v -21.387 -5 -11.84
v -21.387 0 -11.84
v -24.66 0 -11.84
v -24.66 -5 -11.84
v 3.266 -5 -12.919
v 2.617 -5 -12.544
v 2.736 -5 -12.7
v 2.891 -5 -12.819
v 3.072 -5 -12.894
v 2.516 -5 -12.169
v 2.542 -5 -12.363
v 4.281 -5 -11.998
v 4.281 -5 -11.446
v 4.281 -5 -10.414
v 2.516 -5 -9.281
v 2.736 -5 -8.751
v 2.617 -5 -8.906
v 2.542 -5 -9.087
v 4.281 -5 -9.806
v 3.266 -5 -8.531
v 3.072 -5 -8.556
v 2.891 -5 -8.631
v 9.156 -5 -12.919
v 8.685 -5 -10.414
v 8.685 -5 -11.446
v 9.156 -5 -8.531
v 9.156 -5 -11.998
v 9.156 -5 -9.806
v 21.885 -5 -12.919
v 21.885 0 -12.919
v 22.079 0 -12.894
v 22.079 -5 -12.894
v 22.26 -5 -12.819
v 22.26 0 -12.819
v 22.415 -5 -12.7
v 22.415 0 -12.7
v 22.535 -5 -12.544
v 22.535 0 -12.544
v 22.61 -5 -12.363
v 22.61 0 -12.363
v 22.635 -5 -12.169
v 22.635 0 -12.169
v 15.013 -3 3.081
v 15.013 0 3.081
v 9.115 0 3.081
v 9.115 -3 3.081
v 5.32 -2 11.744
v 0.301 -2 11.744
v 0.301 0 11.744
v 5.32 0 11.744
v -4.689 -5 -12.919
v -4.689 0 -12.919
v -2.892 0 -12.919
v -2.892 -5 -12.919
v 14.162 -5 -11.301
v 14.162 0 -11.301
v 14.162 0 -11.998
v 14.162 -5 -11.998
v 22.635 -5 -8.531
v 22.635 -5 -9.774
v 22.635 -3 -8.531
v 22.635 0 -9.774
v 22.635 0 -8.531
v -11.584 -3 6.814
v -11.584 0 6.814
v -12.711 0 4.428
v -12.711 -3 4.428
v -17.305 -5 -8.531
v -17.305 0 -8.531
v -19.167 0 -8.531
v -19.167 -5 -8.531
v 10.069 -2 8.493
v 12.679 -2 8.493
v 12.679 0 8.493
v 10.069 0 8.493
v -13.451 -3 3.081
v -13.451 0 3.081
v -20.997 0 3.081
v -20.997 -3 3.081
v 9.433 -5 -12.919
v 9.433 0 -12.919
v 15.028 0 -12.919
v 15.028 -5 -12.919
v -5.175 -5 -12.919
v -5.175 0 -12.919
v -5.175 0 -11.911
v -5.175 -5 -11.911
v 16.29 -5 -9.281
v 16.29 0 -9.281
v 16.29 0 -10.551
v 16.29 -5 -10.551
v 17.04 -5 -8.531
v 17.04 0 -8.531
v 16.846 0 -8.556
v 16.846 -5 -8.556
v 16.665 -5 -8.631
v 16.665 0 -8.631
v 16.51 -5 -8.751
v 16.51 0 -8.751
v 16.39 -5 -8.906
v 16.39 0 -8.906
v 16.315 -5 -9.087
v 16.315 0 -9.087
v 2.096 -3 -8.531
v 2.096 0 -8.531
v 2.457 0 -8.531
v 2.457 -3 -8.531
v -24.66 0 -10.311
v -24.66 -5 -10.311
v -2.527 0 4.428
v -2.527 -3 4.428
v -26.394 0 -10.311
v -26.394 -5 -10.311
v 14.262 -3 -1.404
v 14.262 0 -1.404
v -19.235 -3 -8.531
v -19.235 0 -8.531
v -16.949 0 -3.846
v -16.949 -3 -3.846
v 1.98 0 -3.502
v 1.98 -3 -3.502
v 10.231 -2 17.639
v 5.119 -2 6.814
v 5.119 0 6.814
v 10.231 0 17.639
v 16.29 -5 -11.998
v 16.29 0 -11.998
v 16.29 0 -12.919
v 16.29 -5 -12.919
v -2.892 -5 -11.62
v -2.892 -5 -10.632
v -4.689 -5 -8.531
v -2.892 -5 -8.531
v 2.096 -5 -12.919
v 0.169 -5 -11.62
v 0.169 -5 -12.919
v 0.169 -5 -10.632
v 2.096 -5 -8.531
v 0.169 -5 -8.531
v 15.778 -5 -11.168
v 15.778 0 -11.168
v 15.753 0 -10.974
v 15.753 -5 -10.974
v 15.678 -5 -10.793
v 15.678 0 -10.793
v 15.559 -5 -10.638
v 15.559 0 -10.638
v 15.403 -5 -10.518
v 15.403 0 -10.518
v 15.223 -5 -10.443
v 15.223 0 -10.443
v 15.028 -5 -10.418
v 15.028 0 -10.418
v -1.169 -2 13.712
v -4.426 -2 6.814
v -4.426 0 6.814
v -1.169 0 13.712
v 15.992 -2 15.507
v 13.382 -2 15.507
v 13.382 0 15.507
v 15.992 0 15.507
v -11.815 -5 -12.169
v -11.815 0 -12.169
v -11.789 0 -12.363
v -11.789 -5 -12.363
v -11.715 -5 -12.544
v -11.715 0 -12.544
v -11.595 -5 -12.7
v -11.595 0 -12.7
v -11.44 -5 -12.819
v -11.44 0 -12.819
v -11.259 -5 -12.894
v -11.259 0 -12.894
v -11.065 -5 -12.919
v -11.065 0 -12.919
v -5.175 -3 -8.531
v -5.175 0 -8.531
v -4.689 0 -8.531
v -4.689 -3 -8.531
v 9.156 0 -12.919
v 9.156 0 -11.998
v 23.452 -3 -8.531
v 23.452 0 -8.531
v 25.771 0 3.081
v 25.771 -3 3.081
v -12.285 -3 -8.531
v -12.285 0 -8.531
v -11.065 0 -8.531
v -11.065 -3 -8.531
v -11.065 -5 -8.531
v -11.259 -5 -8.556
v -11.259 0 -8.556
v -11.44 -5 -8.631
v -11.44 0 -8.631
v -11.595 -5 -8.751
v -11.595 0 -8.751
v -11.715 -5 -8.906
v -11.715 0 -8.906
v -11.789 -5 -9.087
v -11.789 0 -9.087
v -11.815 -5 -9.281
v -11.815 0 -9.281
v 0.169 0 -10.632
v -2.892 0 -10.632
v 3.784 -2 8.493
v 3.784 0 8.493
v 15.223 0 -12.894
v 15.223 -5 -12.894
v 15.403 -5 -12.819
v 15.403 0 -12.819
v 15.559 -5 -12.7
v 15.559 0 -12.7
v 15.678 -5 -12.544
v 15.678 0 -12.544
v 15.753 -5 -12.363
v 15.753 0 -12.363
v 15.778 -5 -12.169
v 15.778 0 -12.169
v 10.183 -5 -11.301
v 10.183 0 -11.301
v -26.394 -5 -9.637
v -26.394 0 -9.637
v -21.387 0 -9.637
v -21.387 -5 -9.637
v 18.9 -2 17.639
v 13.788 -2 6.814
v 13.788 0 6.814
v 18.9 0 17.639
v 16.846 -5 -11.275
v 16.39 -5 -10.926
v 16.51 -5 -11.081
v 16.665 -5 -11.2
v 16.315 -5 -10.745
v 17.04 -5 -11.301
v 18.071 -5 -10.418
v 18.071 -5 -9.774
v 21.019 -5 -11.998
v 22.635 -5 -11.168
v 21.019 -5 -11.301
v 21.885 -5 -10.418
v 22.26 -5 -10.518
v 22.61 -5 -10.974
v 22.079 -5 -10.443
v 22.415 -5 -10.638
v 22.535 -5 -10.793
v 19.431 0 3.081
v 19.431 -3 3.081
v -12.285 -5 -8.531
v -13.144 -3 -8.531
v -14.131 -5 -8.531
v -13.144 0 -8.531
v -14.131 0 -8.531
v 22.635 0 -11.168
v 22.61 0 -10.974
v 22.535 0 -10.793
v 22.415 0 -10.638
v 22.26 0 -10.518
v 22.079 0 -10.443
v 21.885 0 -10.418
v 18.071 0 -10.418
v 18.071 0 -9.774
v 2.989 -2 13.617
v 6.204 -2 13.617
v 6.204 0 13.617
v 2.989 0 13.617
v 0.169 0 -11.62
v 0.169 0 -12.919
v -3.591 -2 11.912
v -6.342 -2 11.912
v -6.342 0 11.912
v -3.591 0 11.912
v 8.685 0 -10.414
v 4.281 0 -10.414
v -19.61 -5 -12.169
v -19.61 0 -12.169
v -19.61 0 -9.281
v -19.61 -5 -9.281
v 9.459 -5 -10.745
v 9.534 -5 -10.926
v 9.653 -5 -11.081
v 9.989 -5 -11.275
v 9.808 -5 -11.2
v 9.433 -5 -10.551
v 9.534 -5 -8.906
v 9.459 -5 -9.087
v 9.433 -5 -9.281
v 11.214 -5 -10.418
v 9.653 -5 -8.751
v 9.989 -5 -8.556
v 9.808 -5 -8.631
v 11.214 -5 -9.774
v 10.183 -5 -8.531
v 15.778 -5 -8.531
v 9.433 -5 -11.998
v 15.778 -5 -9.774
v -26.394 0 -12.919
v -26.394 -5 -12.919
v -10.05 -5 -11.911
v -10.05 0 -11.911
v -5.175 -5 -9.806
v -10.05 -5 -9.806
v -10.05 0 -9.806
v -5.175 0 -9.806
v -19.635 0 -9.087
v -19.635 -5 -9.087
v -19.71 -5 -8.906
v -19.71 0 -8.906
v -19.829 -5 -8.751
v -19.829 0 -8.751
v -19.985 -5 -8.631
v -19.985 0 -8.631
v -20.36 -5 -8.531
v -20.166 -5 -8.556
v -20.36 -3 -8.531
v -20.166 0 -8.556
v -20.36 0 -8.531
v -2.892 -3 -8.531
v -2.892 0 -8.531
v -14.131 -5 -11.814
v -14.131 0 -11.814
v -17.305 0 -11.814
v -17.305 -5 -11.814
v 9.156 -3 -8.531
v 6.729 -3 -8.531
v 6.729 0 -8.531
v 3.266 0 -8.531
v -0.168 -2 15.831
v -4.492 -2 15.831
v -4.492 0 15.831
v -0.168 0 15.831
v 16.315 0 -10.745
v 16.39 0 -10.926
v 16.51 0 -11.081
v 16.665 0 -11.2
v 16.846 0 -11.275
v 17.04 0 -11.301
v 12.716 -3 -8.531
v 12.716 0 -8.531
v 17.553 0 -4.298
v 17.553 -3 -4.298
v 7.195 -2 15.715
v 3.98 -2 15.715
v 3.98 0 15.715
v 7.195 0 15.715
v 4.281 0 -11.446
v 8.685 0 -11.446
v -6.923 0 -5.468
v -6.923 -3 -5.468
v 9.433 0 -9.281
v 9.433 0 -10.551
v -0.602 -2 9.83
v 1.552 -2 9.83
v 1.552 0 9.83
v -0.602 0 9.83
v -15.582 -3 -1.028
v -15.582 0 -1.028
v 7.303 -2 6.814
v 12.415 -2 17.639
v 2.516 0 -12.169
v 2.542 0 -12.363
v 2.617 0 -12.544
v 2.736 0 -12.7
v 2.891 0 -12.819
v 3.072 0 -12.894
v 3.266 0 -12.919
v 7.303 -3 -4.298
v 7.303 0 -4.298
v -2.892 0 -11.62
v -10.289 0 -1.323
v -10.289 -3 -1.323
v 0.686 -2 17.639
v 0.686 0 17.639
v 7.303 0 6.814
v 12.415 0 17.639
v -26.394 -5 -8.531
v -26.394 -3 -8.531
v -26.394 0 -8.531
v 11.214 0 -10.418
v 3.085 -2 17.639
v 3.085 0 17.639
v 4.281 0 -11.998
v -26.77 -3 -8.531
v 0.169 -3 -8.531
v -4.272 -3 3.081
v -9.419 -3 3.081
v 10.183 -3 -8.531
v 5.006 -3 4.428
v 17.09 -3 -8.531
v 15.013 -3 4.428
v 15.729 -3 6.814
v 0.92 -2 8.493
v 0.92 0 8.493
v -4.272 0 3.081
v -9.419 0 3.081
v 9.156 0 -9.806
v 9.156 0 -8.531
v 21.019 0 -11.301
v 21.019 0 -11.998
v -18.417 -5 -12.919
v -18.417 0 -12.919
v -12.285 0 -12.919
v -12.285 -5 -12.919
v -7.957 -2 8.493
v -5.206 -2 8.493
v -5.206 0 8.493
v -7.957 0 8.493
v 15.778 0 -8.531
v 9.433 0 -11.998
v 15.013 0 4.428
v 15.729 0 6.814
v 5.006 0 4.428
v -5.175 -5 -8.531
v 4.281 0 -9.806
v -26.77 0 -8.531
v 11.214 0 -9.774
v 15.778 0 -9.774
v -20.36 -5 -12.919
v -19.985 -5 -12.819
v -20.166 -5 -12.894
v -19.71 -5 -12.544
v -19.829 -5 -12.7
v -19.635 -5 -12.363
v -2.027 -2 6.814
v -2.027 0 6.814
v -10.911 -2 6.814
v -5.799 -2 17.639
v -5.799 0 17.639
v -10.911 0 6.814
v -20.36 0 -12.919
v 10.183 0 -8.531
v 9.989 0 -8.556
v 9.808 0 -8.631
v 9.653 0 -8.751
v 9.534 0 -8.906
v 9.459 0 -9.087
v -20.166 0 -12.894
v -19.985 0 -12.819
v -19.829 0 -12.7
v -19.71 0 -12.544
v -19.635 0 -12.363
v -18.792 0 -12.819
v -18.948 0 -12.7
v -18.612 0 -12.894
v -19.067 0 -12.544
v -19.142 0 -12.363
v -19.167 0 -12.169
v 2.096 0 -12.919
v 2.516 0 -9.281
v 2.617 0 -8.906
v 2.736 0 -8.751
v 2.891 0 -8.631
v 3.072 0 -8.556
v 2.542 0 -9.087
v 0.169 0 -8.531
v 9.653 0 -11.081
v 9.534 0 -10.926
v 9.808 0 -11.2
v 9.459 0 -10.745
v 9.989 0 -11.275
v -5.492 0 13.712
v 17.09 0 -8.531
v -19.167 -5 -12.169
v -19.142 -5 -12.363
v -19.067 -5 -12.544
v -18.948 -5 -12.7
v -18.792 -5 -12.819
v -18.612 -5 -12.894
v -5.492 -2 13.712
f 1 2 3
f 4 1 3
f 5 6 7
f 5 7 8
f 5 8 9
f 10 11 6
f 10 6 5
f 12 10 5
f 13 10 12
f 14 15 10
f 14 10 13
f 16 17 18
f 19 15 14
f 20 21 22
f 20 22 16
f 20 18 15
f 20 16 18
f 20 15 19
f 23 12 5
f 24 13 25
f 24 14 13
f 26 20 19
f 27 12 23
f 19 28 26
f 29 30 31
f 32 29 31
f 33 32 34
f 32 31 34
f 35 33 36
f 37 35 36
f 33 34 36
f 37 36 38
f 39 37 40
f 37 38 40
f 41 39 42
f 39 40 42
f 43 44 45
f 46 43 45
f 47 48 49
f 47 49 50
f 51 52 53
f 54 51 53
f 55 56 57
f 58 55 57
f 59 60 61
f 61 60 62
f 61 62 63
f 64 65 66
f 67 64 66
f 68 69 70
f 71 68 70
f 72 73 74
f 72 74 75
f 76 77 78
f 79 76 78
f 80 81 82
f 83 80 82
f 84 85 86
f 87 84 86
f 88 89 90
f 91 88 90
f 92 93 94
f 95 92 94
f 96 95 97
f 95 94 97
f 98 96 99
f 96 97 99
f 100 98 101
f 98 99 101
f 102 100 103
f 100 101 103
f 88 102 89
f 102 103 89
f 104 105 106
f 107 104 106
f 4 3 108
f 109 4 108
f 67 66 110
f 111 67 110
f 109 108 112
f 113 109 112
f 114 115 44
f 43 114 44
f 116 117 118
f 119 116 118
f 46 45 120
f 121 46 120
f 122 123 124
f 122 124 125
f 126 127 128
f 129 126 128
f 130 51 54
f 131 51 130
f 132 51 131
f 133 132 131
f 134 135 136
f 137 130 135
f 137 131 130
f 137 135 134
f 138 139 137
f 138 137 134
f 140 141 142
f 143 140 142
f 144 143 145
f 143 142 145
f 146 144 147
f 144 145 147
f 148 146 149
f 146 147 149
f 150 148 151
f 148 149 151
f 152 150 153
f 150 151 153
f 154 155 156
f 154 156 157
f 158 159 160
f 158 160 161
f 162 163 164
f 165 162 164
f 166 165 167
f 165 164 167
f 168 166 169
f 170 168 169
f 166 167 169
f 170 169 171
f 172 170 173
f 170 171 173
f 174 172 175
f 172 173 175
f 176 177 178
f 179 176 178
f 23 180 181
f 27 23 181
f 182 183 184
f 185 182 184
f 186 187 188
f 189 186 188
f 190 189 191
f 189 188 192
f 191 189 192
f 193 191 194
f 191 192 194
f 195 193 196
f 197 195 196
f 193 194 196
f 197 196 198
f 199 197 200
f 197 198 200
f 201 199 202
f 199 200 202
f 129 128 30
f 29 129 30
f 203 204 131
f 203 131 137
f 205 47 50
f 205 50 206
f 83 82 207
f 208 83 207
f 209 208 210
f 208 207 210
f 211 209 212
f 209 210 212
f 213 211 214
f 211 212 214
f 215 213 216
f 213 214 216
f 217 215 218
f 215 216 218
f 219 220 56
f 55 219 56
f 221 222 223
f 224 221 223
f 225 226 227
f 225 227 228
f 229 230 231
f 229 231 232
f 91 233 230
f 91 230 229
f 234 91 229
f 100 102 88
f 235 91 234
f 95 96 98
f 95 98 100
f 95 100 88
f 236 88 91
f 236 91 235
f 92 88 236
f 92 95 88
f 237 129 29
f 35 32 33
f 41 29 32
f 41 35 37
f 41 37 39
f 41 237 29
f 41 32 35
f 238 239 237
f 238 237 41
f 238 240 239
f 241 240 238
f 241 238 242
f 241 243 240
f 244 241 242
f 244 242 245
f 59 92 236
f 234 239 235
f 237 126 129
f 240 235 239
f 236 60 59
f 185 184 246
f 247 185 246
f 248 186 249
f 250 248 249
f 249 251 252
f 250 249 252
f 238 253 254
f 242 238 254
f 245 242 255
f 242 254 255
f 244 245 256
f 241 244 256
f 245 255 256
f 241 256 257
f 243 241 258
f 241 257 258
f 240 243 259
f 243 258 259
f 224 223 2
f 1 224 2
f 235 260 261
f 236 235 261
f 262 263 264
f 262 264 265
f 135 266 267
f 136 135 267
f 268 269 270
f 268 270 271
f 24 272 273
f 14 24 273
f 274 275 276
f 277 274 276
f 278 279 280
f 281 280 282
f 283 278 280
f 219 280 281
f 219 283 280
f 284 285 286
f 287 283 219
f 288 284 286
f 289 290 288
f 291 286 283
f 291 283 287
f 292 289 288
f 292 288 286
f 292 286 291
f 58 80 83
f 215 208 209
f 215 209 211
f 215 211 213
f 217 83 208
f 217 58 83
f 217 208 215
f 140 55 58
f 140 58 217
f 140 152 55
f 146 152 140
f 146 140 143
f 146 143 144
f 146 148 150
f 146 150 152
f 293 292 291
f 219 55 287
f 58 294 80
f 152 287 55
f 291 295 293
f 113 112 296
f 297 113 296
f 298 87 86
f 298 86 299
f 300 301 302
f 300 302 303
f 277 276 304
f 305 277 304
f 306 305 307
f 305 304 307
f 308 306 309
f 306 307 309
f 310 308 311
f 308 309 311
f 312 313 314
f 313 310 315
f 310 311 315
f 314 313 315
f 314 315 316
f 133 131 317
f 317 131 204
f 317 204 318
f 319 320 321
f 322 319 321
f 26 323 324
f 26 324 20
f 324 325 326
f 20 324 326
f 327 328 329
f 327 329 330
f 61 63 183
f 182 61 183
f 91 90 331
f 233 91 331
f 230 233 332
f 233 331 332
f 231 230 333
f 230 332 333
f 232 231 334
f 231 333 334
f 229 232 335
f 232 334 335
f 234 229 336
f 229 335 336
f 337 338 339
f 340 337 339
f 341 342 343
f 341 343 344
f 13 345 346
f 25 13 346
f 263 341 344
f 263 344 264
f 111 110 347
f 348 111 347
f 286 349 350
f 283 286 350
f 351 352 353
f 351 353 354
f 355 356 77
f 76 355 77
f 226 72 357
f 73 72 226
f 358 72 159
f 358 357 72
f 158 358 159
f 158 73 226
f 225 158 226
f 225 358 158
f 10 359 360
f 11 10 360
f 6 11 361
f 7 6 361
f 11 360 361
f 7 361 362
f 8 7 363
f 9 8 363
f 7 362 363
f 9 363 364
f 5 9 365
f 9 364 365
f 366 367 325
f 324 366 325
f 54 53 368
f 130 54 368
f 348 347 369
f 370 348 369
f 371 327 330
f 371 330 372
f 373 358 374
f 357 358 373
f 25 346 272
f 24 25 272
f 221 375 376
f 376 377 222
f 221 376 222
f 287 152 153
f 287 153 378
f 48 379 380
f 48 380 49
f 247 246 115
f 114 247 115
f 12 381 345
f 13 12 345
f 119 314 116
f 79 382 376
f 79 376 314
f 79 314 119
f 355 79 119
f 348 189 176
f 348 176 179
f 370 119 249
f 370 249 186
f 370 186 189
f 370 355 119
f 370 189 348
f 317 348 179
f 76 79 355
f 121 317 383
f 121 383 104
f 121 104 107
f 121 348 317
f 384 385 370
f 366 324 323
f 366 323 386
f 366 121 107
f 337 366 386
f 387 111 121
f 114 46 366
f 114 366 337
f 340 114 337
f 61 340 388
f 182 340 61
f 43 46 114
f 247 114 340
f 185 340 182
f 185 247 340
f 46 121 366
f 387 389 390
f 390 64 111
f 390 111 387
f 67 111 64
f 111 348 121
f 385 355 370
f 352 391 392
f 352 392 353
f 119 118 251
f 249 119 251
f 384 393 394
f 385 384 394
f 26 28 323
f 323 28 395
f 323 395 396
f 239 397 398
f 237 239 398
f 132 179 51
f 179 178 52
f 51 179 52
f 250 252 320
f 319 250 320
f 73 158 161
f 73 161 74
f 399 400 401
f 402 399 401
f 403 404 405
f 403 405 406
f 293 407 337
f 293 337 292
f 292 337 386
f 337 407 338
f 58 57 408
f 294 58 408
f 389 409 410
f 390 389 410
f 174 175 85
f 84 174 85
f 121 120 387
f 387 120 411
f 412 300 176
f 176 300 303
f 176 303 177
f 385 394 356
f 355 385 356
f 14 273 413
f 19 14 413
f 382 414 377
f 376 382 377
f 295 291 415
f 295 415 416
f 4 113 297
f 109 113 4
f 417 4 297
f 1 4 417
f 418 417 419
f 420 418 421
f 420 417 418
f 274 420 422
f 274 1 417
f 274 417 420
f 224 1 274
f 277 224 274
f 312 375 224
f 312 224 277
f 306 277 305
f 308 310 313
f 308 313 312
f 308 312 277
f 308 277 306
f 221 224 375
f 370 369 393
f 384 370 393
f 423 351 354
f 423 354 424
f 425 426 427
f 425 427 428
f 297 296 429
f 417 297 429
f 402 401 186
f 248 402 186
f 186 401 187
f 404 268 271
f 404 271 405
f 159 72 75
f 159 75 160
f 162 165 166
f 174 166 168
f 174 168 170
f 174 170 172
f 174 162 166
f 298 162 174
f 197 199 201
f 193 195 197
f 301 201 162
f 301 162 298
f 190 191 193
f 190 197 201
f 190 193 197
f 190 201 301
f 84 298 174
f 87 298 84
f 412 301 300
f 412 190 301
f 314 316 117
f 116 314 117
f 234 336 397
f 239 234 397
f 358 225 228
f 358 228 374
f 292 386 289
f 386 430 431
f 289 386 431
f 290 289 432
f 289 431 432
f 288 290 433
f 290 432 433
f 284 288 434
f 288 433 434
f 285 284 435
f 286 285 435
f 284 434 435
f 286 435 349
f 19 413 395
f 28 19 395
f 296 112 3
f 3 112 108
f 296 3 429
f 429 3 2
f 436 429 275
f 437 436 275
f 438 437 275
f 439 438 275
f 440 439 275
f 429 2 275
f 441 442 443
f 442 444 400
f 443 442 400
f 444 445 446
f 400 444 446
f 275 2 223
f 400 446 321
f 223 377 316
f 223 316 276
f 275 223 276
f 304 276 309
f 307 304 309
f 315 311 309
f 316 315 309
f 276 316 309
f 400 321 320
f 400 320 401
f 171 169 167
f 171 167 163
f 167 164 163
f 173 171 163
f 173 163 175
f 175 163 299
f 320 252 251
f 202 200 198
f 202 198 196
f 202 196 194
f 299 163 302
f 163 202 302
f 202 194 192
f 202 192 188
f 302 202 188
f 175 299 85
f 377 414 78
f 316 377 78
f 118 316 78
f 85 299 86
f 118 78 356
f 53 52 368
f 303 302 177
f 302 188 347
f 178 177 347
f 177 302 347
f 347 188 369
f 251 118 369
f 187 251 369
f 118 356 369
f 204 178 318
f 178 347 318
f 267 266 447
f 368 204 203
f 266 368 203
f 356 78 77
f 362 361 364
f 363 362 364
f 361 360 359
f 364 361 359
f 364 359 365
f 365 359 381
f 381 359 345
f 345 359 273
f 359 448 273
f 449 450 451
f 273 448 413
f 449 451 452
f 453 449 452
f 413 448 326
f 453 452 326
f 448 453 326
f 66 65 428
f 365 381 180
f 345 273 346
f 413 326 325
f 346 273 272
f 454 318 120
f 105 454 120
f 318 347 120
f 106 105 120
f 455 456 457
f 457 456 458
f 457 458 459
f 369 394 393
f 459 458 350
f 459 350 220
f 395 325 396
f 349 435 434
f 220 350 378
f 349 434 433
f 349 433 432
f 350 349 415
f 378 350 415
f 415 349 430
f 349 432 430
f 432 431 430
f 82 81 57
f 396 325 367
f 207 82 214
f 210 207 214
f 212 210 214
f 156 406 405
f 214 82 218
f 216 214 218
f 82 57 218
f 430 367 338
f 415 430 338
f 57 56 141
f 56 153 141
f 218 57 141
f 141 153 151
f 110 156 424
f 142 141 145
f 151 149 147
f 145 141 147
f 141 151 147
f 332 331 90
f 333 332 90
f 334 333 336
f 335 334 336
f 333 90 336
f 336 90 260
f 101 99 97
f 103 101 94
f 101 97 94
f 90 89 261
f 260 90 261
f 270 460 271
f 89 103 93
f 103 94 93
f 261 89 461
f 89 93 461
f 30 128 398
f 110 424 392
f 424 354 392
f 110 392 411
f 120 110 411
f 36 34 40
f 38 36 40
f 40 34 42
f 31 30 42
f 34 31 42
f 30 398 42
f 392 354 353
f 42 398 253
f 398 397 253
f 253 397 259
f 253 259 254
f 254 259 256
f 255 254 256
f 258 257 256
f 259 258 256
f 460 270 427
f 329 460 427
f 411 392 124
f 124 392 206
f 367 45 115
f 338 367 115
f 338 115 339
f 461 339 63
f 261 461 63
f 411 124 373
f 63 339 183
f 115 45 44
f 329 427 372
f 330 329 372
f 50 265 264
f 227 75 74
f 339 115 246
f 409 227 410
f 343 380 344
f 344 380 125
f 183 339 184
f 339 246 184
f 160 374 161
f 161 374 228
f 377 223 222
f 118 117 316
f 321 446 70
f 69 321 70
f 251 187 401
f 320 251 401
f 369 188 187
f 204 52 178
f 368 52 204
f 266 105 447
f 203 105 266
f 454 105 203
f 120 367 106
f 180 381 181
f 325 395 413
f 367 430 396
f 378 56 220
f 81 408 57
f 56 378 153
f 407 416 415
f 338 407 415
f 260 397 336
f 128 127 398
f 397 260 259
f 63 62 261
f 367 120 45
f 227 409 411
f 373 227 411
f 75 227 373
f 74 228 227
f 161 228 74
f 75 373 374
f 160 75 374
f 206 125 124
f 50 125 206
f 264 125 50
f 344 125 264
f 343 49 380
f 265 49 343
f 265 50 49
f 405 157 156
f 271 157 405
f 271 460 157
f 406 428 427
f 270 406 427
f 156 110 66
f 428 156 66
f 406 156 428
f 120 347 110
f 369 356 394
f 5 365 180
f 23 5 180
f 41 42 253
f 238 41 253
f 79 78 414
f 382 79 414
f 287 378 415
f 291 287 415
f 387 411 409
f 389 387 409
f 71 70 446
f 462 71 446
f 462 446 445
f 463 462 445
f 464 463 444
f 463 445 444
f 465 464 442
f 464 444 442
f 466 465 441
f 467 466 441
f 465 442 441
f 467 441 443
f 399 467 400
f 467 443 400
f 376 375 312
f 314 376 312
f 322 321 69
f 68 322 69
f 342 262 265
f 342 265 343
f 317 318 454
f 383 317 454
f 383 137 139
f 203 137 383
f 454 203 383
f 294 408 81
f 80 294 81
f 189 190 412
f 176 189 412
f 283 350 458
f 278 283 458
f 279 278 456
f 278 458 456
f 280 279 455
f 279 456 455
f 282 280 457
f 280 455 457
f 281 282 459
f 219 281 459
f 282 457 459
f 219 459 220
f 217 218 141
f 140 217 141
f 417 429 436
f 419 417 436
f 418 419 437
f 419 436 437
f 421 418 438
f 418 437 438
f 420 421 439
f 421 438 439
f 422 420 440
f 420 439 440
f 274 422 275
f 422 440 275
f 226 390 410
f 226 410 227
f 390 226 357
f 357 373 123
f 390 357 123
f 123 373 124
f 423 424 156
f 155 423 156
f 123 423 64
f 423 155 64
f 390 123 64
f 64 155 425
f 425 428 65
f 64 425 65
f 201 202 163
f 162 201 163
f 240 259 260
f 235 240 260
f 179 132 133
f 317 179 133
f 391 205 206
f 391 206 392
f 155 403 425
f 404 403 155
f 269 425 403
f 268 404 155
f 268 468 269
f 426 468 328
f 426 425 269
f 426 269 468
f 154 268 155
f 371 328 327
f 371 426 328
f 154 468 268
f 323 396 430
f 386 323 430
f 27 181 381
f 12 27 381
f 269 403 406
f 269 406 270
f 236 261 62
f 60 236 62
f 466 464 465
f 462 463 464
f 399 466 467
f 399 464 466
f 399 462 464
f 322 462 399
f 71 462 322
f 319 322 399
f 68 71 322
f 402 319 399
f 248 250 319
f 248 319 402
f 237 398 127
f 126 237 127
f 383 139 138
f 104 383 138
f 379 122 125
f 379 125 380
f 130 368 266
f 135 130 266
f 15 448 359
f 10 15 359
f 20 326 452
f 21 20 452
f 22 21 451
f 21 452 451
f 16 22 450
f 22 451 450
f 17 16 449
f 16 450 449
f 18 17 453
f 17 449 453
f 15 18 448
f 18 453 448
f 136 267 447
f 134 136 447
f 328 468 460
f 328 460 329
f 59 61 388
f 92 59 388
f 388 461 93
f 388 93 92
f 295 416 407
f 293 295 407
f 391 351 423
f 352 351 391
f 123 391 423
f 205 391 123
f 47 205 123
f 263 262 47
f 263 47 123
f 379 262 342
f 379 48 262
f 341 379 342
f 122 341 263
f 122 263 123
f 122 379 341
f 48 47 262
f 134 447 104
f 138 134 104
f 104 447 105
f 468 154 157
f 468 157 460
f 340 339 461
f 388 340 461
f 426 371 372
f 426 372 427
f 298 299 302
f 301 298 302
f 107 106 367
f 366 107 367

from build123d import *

# Parameters (mm, degrees)
F0_W     = 3.0607780209
F0_H     = 2.1009956449
F1_DEPTH = 5
F3_DEPTH = 2
F4_START = -3
F4_DEPTH = 2


with BuildPart() as f1:
    # F0 (on Front) → F1 (new body)
    with BuildSketch(Plane.XZ):
        with BuildLine():
            Line((-13.4510826319, 3.0807058793), (-20.9973859143, 3.0807058793))
            Line((-20.9973859143, 3.0807058793), (-26.770388545, -8.5309240967))
            Line((-26.770388545, -8.5309240967), (-26.3940021396, -8.5309240967))
            Line((-26.3940021396, -8.5309240967), (-26.3940021396, -9.6365026161))
            Line((-26.3940021396, -9.6365026161), (-21.3870331645, -9.6365026161))
            Line((-21.3870331645, -9.6365026161), (-21.3870331645, -11.8402632847))
            Line((-21.3870331645, -11.8402632847), (-24.6597826481, -11.8402632847))
            Line((-24.6597826481, -11.8402632847), (-24.6597826481, -10.3107876107))
            Line((-24.6597826481, -10.3107876107), (-26.3940021396, -10.3107876107))
            Line((-26.3940021396, -10.3107876107), (-26.3940021396, -12.9192377403))
            Line((-26.3940021396, -12.9192377403), (-20.359800871, -12.9192377403))
            ThreePointArc((-20.359800871, -12.9192377403), (-19.8294707851, -12.6995678262), (-19.609800871, -12.1692377403))
            Line((-19.609800871, -12.1692377403), (-19.609800871, -9.2809240967))
            ThreePointArc((-19.609800871, -9.2809240967), (-19.8294707851, -8.7505940108), (-20.359800871, -8.5309240967))
            Line((-20.359800871, -8.5309240967), (-19.2351932671, -8.5309240967))
            Line((-19.2351932671, -8.5309240967), (-16.9493351132, -3.8456239272))
            Line((-16.9493351132, -3.8456239272), (-13.144302211, -8.5309240967))
            Line((-13.144302211, -8.5309240967), (-14.130868949, -8.5309240967))
            Line((-14.130868949, -8.5309240967), (-14.130868949, -11.8141257167))
            Line((-14.130868949, -11.8141257167), (-17.3050090671, -11.8141257167))
            Line((-17.3050090671, -11.8141257167), (-17.3050090671, -8.5309240967))
            Line((-17.3050090671, -8.5309240967), (-19.167387858, -8.5309240967))
            Line((-19.167387858, -8.5309240967), (-19.167387858, -12.1691745073))
            ThreePointArc((-19.167387858, -12.1691745073), (-18.9477179439, -12.6995045932), (-18.417387858, -12.9191745073))
            Line((-18.417387858, -12.9191745073), (-12.2846849263, -12.9191745073))
            Line((-12.2846849263, -12.9191745073), (-12.2846849263, -8.5309240967))
            Line((-12.2846849263, -8.5309240967), (-11.065042235, -8.5309240967))
            ThreePointArc((-11.065042235, -8.5309240967), (-11.5953723208, -8.7505940108), (-11.815042235, -9.2809240967))
            Line((-11.815042235, -9.2809240967), (-11.815042235, -12.1692377403))
            ThreePointArc((-11.815042235, -12.1692377403), (-11.5953723208, -12.6995678262), (-11.065042235, -12.9192377403))
            Line((-11.065042235, -12.9192377403), (-5.1752589643, -12.9192377403))
            Line((-5.1752589643, -12.9192377403), (-5.1752589643, -11.9112924635))
            Line((-5.1752589643, -11.9112924635), (-10.0498311222, -11.9112924635))
            Line((-10.0498311222, -11.9112924635), (-10.0498311222, -9.8059958741))
            Line((-10.0498311222, -9.8059958741), (-5.1752589643, -9.8059958741))
            Line((-5.1752589643, -9.8059958741), (-5.1752589643, -8.5309240967))
            Line((-5.1752589643, -8.5309240967), (-4.6894219704, -8.5309240967))
            Line((-4.6894219704, -8.5309240967), (-4.6894219704, -12.9192377403))
            Line((-4.6894219704, -12.9192377403), (-2.891822136, -12.9192377403))
            Line((-2.891822136, -12.9192377403), (-2.891822136, -11.6197903603))
            Line((-2.891822136, -11.6197903603), (0.1689558849, -11.6197903603))
            Line((0.1689558849, -11.6197903603), (0.1689558849, -12.9192377403))
            Line((0.1689558849, -12.9192377403), (2.096112119, -12.9192377403))
            Line((2.096112119, -12.9192377403), (2.096112119, -8.5309240967))
            Line((2.096112119, -8.5309240967), (2.4571896065, -8.5309240967))
            Line((2.4571896065, -8.5309240967), (7.3034735397, -4.2975358665))
            Line((7.3034735397, -4.2975358665), (6.7291194573, -8.5309240967))
            Line((6.7291194573, -8.5309240967), (3.2661118247, -8.5309240967))
            ThreePointArc((3.2661118247, -8.5309240967), (2.7357817388, -8.7505940108), (2.5161118247, -9.2809240967))
            Line((2.5161118247, -9.2809240967), (2.5161118247, -12.1692377403))
            ThreePointArc((2.5161118247, -12.1692377403), (2.7357817388, -12.6995678262), (3.2661118247, -12.9192377403))
            Line((3.2661118247, -12.9192377403), (9.1558950953, -12.9192377403))
            Line((9.1558950953, -12.9192377403), (9.1558950953, -11.9984643534))
            Line((9.1558950953, -11.9984643534), (4.2813229375, -11.9984643534))
            Line((4.2813229375, -11.9984643534), (4.2813229375, -11.445844546))
            Line((4.2813229375, -11.445844546), (8.6850486696, -11.445844546))
            Line((8.6850486696, -11.445844546), (8.6850486696, -10.4135535657))
            Line((8.6850486696, -10.4135535657), (4.2813229375, -10.4135535657))
            Line((4.2813229375, -10.4135535657), (4.2813229375, -9.805932641))
            Line((4.2813229375, -9.805932641), (9.1558950953, -9.805932641))
            Line((9.1558950953, -9.805932641), (9.1558950953, -8.5309240967))
            Line((9.1558950953, -8.5309240967), (10.1831596047, -8.5309240967))
            ThreePointArc((10.1831596047, -8.5309240967), (9.6528295188, -8.7505940108), (9.4331596047, -9.2809240967))
            Line((9.4331596047, -9.2809240967), (9.4331596047, -10.550885953))
            ThreePointArc((9.4331596047, -10.550885953), (9.6528295188, -11.0812160389), (10.1831596047, -11.300885953))
            Line((10.1831596047, -11.300885953), (14.1622014344, -11.300885953))
            Line((14.1622014344, -11.300885953), (14.1622014344, -11.9984643534))
            Line((14.1622014344, -11.9984643534), (9.4331596047, -11.9984643534))
            Line((9.4331596047, -11.9984643534), (9.4331596047, -12.9191745073))
            Line((9.4331596047, -12.9191745073), (15.0284558833, -12.9191745073))
            ThreePointArc((15.0284558833, -12.9191745073), (15.5587859692, -12.6995045932), (15.7784558833, -12.1691745073))
            Line((15.7784558833, -12.1691745073), (15.7784558833, -11.1678693146))
            ThreePointArc((15.7784558833, -11.1678693146), (15.5587859692, -10.6375392287), (15.0284558833, -10.4178693146))
            Line((15.0284558833, -10.4178693146), (11.2140327692, -10.4178693146))
            Line((11.2140327692, -10.4178693146), (11.2140327692, -9.7743598744))
            Line((11.2140327692, -9.7743598744), (15.7784558833, -9.7743598744))
            Line((15.7784558833, -9.7743598744), (15.7784558833, -8.5309240967))
            Line((15.7784558833, -8.5309240967), (12.7156563103, -8.5309240967))
            Line((12.7156563103, -8.5309240967), (17.5534840673, -4.2975358665))
            Line((17.5534840673, -4.2975358665), (17.0895829797, -8.5309240967))
            Line((17.0895829797, -8.5309240967), (17.0398395211, -8.5309240967))
            ThreePointArc((17.0398395211, -8.5309240967), (16.5095094352, -8.7505940108), (16.2898395211, -9.2809240967))
            Line((16.2898395211, -9.2809240967), (16.2898395211, -10.550885953))
            ThreePointArc((16.2898395211, -10.550885953), (16.5095094352, -11.0812160389), (17.0398395211, -11.300885953))
            Line((17.0398395211, -11.300885953), (21.0188813508, -11.300885953))
            Line((21.0188813508, -11.300885953), (21.0188813508, -11.9984643534))
            Line((21.0188813508, -11.9984643534), (16.2898395211, -11.9984643534))
            Line((16.2898395211, -11.9984643534), (16.2898395211, -12.9191745073))
            Line((16.2898395211, -12.9191745073), (21.8851357996, -12.9191745073))
            ThreePointArc((21.8851357996, -12.9191745073), (22.4154658855, -12.6995045932), (22.6351357996, -12.1691745073))
            Line((22.6351357996, -12.1691745073), (22.6351357996, -11.1678693146))
            ThreePointArc((22.6351357996, -11.1678693146), (22.4154658855, -10.6375392287), (21.8851357996, -10.4178693146))
            Line((21.8851357996, -10.4178693146), (18.0707126856, -10.4178693146))
            Line((18.0707126856, -10.4178693146), (18.0707126856, -9.7743598744))
            Line((18.0707126856, -9.7743598744), (22.6351357996, -9.7743598744))
            Line((22.6351357996, -9.7743598744), (22.6351357996, -8.5309240967))
            Line((22.6351357996, -8.5309240967), (23.4516598284, -8.5309240967))
            Line((23.4516598284, -8.5309240967), (25.7711652666, 3.0807058793))
            Line((25.7711652666, 3.0807058793), (19.431181252, 3.0807058793))
            Line((19.431181252, 3.0807058793), (14.2619935796, -1.4036741341))
            Line((14.2619935796, -1.4036741341), (15.0130717084, 3.0807058793))
            Line((15.0130717084, 3.0807058793), (9.1148968786, 3.0807058793))
            Line((9.1148968786, 3.0807058793), (1.9796516281, -3.5022755619))
            Line((1.9796516281, -3.5022755619), (5.0060558133, 4.4282288291))
            Line((5.0060558133, 4.4282288291), (15.0130717084, 4.4282288291))
            Line((15.0130717084, 4.4282288291), (15.7288057171, 6.8140071817))
            Line((15.7288057171, 6.8140071817), (-11.583940126, 6.8140071817))
            Line((-11.583940126, 6.8140071817), (-12.7105582505, 4.4282288291))
            Line((-12.7105582505, 4.4282288291), (-2.5268180761, 4.4282288291))
            Line((-2.5268180761, 4.4282288291), (-6.9228359498, -5.4683336057))
            Line((-6.9228359498, -5.4683336057), (-10.288979272, -1.3234569953))
            Line((-10.288979272, -1.3234569953), (-4.2719710618, 3.0807058793))
            Line((-4.2719710618, 3.0807058793), (-9.4190677628, 3.0807058793))
            Line((-9.4190677628, 3.0807058793), (-15.5823286623, -1.0281349532))
            Line((-15.5823286623, -1.0281349532), (-13.4510826319, 3.0807058793))
        make_face()
        with Locations((-1.3614331256, -9.5814219192)):
            Rectangle(F0_W, F0_H, mode=Mode.SUBTRACT)
    extrude(amount=F1_DEPTH)

    # F2 (on face) → F3 (cut)
    with BuildSketch(Plane.XZ.offset(5)):
        Polygon((-26.770388545, 6.8140071817), (-26.770388545, -8.5309240967), (26.5221912414, -8.5309240967), (26.5221912414, 6.8140071817), (13.7877286713, 6.8140071817), (7.3034735397, 6.8140071817), (5.1193437539, 6.8140071817), (4.2332103827, 6.8140071817), (2.1055981025, 6.8140071817), (-2.0268179942, 6.8140071817), (-4.4263883249, 6.8140071817), (-10.9106434565, 6.8140071817), align=None)
        Polygon((-5.7986674306, 17.639362709), (-10.9106434565, 6.8140071817), (-4.4263883249, 6.8140071817), (-1.1687912286, 13.7124446064), (-5.4921403697, 13.7124446064), (-4.4917744037, 15.8308655821), (-0.1684252625, 15.8308655821), (0.685587701, 17.639362709), align=None)
        Polygon((-7.9570718311, 8.492592384), (-6.3421407991, 11.9124446064), (-3.5912522867, 11.9124446064), (-5.2061833186, 8.492592384), align=None, mode=Mode.SUBTRACT)
        Polygon((7.3034735397, 6.8140071817), (13.7877286713, 6.8140071817), (18.8997046972, 17.639362709), (12.4154495655, 17.639362709), align=None)
        Polygon((10.0692709763, 8.492592384), (13.3818611683, 15.5074857175), (15.9919188063, 15.5074857175), (12.6793286143, 8.492592384), align=None, mode=Mode.SUBTRACT)
        Polygon((-0.6024195059, 9.8303789273), (-2.0268179942, 6.8140071817), (2.1055981025, 6.8140071817), (4.2332103827, 6.8140071817), (5.1193437539, 6.8140071817), (10.2313197798, 17.639362709), (3.0851580317, 17.639362709), (0.3012099711, 11.7439462647), (5.3197594389, 11.7439462647), (3.7843971086, 8.492592384), (0.9204373378, 8.492592384), (1.5521701913, 9.8303789273), align=None)
        Polygon((2.98915204, 13.6170848409), (3.9799346353, 15.7152116299), (7.1950801421, 15.7152116299), (6.2042975468, 13.6170848409), align=None, mode=Mode.SUBTRACT)
    extrude(amount=-F3_DEPTH, mode=Mode.SUBTRACT)

    # F2 (on face) → F4 (join)
    with BuildSketch(Plane.XZ.offset(5).offset(F4_START)):
        Polygon((-5.7986674306, 17.639362709), (-10.9106434565, 6.8140071817), (-4.4263883249, 6.8140071817), (-1.1687912286, 13.7124446064), (-5.4921403697, 13.7124446064), (-4.4917744037, 15.8308655821), (-0.1684252625, 15.8308655821), (0.685587701, 17.639362709), align=None)
        Polygon((-7.9570718311, 8.492592384), (-6.3421407991, 11.9124446064), (-3.5912522867, 11.9124446064), (-5.2061833186, 8.492592384), align=None, mode=Mode.SUBTRACT)
        Polygon((-0.6024195059, 9.8303789273), (-2.0268179942, 6.8140071817), (2.1055981025, 6.8140071817), (4.2332103827, 6.8140071817), (5.1193437539, 6.8140071817), (10.2313197798, 17.639362709), (3.0851580317, 17.639362709), (0.3012099711, 11.7439462647), (5.3197594389, 11.7439462647), (3.7843971086, 8.492592384), (0.9204373378, 8.492592384), (1.5521701913, 9.8303789273), align=None)
        Polygon((2.98915204, 13.6170848409), (3.9799346353, 15.7152116299), (7.1950801421, 15.7152116299), (6.2042975468, 13.6170848409), align=None, mode=Mode.SUBTRACT)
        Polygon((12.4154495655, 17.639362709), (7.3034735397, 6.8140071817), (13.7877286713, 6.8140071817), (18.8997046972, 17.639362709), align=None)
        Polygon((10.0692709763, 8.492592384), (13.3818611683, 15.5074857175), (15.9919188063, 15.5074857175), (12.6793286143, 8.492592384), align=None, mode=Mode.SUBTRACT)
    extrude(amount=-F4_DEPTH)


solid = f1.part
